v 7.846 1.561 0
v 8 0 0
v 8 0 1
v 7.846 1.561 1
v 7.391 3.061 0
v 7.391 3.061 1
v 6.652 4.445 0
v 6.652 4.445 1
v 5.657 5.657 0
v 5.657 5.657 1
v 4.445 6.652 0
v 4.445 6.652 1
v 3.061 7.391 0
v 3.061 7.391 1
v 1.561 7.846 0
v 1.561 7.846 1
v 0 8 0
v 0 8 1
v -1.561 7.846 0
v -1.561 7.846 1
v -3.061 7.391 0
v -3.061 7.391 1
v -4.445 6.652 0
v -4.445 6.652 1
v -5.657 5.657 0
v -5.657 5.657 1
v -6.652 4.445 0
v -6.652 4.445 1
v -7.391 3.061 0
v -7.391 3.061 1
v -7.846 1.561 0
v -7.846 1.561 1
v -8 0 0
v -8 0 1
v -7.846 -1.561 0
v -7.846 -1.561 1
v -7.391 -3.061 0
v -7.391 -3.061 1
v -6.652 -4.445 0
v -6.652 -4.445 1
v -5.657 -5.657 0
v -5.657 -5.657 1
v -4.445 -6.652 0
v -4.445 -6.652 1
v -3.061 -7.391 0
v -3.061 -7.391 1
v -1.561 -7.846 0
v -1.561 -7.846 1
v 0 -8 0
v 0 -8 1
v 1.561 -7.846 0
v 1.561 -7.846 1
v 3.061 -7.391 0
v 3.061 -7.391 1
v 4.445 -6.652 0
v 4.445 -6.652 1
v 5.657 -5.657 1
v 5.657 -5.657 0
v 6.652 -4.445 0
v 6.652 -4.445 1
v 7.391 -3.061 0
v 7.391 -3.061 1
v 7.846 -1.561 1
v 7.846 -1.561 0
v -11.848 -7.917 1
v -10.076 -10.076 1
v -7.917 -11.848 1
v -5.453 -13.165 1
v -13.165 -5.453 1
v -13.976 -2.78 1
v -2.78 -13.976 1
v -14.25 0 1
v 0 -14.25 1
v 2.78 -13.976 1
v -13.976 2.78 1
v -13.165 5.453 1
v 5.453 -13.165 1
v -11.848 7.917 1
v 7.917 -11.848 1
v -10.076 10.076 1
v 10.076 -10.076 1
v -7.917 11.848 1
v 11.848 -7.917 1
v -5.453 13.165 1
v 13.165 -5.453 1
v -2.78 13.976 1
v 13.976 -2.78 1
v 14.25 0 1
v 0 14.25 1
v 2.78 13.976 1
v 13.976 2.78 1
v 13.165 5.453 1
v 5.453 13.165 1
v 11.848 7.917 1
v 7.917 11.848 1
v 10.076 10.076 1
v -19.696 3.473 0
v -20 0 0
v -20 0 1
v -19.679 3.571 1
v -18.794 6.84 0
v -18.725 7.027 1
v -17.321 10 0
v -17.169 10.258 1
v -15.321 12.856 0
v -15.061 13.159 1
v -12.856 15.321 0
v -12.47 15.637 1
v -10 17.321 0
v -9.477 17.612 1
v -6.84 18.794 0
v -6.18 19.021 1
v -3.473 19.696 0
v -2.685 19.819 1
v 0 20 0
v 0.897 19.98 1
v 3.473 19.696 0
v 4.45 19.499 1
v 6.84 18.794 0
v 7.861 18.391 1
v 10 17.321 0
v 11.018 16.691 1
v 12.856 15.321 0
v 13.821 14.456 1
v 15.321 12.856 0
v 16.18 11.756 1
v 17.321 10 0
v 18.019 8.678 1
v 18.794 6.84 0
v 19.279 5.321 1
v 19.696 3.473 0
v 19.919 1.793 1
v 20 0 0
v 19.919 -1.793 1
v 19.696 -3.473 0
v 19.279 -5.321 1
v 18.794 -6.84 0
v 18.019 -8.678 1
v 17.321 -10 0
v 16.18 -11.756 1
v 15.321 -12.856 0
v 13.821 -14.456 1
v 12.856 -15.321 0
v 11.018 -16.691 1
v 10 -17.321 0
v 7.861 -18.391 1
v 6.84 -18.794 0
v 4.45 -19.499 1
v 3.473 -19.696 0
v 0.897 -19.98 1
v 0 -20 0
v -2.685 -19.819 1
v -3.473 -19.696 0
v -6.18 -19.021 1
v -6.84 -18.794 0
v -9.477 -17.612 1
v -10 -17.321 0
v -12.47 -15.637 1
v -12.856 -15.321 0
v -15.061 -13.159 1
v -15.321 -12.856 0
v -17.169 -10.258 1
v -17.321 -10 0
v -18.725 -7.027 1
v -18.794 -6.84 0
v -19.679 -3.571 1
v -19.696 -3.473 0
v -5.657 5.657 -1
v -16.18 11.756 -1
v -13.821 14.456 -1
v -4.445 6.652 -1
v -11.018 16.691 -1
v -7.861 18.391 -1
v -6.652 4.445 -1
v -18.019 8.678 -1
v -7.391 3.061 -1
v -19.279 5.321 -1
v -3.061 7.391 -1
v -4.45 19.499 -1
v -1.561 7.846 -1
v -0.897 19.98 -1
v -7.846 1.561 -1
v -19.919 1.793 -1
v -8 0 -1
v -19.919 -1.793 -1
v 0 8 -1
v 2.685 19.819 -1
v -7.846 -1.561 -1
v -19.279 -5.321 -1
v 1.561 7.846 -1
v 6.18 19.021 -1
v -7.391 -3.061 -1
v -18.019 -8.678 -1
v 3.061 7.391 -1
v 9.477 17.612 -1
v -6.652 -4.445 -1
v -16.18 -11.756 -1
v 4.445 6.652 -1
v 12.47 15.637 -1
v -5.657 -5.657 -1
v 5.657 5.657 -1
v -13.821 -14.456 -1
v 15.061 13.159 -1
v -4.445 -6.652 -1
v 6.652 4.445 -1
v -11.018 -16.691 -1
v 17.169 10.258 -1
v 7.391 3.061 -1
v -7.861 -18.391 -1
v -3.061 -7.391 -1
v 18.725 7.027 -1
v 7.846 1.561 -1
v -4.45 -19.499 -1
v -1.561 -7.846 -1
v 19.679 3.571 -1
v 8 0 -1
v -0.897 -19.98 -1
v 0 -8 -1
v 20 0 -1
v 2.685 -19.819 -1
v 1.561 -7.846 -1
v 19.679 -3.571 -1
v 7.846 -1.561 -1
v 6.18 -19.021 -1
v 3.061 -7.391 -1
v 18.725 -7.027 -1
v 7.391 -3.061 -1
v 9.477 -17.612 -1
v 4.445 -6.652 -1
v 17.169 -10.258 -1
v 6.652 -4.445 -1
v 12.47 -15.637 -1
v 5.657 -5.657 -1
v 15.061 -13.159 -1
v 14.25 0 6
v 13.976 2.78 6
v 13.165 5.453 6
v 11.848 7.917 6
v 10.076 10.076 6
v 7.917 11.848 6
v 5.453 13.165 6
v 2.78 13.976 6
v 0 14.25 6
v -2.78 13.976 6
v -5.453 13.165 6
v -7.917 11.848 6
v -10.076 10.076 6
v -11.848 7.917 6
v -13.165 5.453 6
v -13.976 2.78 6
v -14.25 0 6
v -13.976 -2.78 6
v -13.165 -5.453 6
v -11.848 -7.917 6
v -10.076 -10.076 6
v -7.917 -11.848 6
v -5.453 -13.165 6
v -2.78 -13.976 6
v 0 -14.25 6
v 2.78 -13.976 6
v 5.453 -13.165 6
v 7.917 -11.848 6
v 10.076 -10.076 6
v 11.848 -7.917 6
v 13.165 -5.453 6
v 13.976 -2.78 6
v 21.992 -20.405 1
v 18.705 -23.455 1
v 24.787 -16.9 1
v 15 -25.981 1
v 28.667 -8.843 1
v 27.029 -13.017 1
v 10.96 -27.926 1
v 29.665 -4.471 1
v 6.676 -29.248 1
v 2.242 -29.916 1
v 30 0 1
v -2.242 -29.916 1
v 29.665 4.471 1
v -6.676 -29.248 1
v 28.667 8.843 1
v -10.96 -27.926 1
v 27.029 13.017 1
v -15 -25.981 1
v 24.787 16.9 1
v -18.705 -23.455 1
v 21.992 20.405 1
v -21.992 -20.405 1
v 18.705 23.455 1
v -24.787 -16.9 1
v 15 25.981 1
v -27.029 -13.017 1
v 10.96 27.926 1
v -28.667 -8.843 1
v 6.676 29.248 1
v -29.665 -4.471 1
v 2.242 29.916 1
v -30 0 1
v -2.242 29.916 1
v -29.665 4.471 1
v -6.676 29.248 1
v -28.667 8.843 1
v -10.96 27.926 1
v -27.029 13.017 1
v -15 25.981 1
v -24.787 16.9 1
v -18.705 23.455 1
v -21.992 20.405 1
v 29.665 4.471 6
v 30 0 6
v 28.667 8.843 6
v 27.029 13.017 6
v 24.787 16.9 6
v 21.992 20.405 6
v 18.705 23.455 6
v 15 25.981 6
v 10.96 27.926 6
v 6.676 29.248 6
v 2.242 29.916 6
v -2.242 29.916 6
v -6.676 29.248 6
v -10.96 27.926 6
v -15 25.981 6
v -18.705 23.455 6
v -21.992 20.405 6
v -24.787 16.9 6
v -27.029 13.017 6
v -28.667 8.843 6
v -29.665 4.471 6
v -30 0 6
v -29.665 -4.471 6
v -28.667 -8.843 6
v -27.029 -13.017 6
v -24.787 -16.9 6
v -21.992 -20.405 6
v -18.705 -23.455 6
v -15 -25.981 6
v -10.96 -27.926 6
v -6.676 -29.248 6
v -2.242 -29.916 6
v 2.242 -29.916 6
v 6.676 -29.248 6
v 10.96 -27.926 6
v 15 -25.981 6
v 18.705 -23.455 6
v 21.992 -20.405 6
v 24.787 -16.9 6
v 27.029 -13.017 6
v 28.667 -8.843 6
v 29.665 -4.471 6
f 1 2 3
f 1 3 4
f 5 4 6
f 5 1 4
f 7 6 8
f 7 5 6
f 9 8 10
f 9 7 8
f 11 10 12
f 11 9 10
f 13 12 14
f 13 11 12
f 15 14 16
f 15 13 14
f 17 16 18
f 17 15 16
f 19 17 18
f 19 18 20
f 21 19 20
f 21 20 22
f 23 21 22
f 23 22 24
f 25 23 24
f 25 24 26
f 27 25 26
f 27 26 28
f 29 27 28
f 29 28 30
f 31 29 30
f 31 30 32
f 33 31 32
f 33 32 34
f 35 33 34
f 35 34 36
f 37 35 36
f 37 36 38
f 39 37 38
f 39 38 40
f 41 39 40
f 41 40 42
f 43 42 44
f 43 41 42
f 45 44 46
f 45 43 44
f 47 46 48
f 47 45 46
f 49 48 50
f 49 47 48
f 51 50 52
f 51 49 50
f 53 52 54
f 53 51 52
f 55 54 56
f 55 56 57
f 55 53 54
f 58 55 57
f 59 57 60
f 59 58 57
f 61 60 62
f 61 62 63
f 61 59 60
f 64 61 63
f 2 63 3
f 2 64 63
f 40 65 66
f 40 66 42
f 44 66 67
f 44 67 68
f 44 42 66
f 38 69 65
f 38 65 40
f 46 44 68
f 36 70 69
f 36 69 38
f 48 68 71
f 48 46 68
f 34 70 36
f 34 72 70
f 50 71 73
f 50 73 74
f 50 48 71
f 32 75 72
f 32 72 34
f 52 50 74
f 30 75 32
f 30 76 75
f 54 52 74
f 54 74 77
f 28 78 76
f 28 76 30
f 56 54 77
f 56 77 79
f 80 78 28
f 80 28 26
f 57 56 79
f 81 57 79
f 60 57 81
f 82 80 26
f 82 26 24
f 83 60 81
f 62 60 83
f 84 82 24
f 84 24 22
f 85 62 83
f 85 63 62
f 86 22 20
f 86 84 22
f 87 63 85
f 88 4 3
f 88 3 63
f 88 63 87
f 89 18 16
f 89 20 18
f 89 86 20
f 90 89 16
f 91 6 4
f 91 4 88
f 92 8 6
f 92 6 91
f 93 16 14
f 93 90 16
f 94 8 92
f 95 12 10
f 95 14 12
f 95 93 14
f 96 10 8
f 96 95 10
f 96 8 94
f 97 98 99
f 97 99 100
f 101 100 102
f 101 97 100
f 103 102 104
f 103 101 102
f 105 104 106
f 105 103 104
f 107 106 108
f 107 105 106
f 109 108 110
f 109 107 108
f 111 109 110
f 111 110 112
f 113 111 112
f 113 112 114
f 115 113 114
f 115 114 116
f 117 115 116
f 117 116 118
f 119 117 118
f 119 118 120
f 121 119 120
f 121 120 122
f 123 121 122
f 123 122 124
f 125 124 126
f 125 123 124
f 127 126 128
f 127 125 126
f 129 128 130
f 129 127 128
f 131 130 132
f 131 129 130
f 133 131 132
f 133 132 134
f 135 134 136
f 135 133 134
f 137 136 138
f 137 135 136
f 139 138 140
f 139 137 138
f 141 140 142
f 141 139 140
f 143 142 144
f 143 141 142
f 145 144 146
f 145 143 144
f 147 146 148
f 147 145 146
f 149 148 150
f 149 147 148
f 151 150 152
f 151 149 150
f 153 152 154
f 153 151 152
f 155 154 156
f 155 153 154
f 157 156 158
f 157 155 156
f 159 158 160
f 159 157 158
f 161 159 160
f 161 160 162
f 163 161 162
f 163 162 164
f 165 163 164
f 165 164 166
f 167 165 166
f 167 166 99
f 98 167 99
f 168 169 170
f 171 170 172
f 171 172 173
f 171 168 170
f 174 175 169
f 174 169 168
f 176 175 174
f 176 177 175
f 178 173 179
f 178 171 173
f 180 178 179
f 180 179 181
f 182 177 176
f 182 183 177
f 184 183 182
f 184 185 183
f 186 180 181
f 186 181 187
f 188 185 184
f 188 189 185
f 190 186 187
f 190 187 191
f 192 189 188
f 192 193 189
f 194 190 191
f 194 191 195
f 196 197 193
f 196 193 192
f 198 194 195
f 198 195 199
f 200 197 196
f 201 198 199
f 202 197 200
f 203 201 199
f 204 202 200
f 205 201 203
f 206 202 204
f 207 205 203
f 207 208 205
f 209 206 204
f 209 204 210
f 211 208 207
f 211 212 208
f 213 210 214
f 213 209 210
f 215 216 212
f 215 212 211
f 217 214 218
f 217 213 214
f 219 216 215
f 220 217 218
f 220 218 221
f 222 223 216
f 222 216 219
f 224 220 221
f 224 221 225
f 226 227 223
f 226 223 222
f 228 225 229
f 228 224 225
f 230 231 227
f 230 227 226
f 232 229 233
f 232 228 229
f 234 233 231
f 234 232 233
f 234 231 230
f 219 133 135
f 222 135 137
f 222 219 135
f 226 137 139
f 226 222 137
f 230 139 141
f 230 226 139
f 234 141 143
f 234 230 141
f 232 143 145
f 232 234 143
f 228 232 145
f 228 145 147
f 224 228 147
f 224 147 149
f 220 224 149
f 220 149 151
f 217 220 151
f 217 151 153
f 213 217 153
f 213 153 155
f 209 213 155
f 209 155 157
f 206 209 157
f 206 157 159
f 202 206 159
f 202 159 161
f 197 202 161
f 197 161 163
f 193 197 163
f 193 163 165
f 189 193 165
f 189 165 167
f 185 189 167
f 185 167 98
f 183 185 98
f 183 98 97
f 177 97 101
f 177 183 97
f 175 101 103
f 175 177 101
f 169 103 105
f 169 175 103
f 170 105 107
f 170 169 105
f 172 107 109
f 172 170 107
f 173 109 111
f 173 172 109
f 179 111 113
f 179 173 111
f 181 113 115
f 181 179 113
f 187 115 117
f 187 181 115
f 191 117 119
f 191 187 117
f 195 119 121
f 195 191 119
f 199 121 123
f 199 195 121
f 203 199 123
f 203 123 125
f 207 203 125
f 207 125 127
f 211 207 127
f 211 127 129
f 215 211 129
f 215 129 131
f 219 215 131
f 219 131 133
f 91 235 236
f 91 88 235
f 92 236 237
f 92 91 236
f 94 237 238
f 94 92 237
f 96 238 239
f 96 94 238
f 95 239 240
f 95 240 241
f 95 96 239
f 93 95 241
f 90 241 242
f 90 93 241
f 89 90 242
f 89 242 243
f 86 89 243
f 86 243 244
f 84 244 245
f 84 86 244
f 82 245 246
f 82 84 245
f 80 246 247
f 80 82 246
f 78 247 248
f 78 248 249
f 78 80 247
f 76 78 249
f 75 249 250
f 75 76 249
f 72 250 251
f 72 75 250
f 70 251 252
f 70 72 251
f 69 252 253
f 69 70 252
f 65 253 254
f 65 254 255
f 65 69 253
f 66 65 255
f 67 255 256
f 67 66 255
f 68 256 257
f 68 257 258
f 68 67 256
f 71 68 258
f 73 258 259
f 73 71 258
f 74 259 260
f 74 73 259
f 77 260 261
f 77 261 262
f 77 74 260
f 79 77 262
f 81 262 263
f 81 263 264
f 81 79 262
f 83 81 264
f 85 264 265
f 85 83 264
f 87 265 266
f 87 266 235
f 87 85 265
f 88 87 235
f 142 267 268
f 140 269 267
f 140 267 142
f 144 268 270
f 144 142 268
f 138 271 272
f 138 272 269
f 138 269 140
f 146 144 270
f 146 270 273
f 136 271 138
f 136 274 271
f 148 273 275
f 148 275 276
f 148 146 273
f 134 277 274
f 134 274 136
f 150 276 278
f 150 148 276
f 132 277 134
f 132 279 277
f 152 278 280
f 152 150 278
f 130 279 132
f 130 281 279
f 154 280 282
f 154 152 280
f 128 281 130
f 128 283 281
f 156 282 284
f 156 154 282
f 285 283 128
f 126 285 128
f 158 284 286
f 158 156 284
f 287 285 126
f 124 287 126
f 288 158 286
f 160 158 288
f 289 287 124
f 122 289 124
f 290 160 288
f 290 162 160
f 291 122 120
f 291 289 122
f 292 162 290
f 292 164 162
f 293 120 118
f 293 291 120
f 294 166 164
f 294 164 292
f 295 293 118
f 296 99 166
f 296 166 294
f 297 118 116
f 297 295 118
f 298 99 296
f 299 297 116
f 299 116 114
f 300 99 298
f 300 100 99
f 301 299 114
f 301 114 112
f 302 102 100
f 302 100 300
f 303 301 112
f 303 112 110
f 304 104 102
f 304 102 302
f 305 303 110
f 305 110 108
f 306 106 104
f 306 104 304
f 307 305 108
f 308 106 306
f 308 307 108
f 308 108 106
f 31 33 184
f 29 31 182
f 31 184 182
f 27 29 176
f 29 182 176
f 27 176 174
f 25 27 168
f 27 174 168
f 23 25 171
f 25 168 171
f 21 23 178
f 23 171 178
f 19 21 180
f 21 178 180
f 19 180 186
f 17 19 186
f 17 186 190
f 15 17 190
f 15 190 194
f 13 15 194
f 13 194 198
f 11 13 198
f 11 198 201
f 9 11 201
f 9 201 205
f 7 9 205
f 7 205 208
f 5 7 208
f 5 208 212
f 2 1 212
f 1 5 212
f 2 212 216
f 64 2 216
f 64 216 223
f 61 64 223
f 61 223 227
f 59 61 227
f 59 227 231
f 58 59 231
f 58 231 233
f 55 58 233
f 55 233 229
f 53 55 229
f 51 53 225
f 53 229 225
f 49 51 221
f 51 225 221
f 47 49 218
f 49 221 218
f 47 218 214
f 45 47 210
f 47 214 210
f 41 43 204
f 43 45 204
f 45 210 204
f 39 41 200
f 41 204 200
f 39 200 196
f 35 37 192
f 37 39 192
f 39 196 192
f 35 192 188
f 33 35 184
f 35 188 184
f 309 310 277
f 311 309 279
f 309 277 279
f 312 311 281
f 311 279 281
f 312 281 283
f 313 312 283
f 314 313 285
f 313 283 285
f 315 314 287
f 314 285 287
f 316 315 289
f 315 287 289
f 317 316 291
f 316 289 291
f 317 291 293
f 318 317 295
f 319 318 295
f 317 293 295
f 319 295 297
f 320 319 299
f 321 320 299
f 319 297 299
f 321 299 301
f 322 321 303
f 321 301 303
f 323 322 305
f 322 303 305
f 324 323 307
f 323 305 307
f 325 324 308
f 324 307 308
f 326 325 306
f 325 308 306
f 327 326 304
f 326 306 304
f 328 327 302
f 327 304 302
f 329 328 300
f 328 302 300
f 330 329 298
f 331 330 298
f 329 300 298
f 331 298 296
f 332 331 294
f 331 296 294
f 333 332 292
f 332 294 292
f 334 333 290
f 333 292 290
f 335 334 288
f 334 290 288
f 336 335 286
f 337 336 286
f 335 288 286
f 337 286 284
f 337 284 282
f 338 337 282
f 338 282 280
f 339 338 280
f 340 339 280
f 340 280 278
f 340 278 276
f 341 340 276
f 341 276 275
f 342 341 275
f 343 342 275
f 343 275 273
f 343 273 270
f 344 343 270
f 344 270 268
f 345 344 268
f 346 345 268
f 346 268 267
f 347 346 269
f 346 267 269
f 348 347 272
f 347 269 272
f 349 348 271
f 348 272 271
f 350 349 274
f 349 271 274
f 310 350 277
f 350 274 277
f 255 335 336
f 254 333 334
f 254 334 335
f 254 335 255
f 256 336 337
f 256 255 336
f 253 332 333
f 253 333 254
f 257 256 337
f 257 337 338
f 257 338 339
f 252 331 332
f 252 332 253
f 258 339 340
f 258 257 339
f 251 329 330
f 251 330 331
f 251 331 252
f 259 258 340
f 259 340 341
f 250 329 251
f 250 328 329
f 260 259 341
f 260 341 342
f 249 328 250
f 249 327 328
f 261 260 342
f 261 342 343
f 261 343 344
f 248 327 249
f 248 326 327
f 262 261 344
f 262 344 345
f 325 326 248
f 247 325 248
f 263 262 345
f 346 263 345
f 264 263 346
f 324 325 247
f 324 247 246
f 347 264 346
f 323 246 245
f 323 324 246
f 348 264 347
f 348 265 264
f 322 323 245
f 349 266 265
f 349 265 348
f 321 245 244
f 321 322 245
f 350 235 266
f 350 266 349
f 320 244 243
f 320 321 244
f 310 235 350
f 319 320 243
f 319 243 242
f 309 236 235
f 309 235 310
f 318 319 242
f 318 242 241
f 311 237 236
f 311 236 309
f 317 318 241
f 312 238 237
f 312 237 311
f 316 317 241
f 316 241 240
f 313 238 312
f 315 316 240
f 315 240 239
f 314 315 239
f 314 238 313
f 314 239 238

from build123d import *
from build123d.topology import SkipClean

# Parameters (mm, degrees)
SKETCH2_R           = 30
SKETCH2_R_2         = 8
BOSS_EXTRUDE1_DEPTH = 2
SKETCH3_R           = 30
SKETCH3_R_2         = 14.25
BOSS_EXTRUDE2_DEPTH = 5
CUT_EXTRUDE1_START  = -1
SKETCH5_R           = 14.25
SKETCH5_R_2         = 8
CUT_EXTRUDE1_DEPTH  = 1
SKETCH7_R           = 30
SKETCH7_R_2         = 14.25
BOSS_EXTRUDE4_DEPTH = 1
CUT_EXTRUDE3_START  = -2
SKETCH8_R           = 30
SKETCH8_R_2         = 14.25
CUT_EXTRUDE3_DEPTH  = 2
BOSS_EXTRUDE6_START = 1
SKETCH10_R          = 20
SKETCH10_R_2        = 8
BOSS_EXTRUDE6_DEPTH = 1
SKETCH11_R          = 30
SKETCH11_R_2        = 20
CUT_EXTRUDE4_DEPTH  = 1


with BuildPart() as part:
    # Sketch2 → Boss-Extrude1 (new body)
    with BuildSketch(Plane.XY):
        Circle(SKETCH2_R)
        Circle(SKETCH2_R_2, mode=Mode.SUBTRACT)
    extrude(amount=BOSS_EXTRUDE1_DEPTH)

    # Sketch3 → Boss-Extrude2 (add)
    with BuildSketch(Plane.XY.offset(2)):
        Circle(SKETCH3_R)
        Circle(SKETCH3_R_2, mode=Mode.SUBTRACT)
    extrude(amount=BOSS_EXTRUDE2_DEPTH)

    # Sketch5 → Cut-Extrude1 (cut)
    with BuildSketch(Plane.XY.offset(2).offset(CUT_EXTRUDE1_START)):
        Circle(SKETCH5_R)
        Circle(SKETCH5_R_2, mode=Mode.SUBTRACT)
    extrude(amount=CUT_EXTRUDE1_DEPTH, mode=Mode.SUBTRACT)

    # Sketch7 → Boss-Extrude4 (add)
    with BuildSketch(Plane.XY.offset(7)):
        Circle(SKETCH7_R)
        Circle(SKETCH7_R_2, mode=Mode.SUBTRACT)
    extrude(amount=BOSS_EXTRUDE4_DEPTH)

    # Sketch8 → Cut-Extrude3 (cut)
    with BuildSketch(Plane.XY.offset(8).offset(CUT_EXTRUDE3_START)):
        Circle(SKETCH8_R)
        Circle(SKETCH8_R_2, mode=Mode.SUBTRACT)
    extrude(amount=CUT_EXTRUDE3_DEPTH, mode=Mode.SUBTRACT)

    # Sketch10 → Boss-Extrude6 (add)
    with SkipClean():  # the faces are left unmerged after this step: merging them gives an invalid solid
        with BuildSketch(Plane(origin=(0, 0, 0), x_dir=(-1, 0, 0), z_dir=(0, 0, -1)).offset(BOSS_EXTRUDE6_START)):
            with Locations(Location((0, 0, 0), (0, 0, 180))):
                Circle(SKETCH10_R)
            Circle(SKETCH10_R_2, mode=Mode.SUBTRACT)
        extrude(amount=-BOSS_EXTRUDE6_DEPTH)

    # Sketch11 → Cut-Extrude4 (cut)
    with BuildSketch(Plane(origin=(0, 0, 0), x_dir=(-1, 0, 0), z_dir=(0, 0, -1))):
        Circle(SKETCH11_R)
        Circle(SKETCH11_R_2, mode=Mode.SUBTRACT)
    extrude(amount=-CUT_EXTRUDE4_DEPTH, mode=Mode.SUBTRACT)


solid = part.part
